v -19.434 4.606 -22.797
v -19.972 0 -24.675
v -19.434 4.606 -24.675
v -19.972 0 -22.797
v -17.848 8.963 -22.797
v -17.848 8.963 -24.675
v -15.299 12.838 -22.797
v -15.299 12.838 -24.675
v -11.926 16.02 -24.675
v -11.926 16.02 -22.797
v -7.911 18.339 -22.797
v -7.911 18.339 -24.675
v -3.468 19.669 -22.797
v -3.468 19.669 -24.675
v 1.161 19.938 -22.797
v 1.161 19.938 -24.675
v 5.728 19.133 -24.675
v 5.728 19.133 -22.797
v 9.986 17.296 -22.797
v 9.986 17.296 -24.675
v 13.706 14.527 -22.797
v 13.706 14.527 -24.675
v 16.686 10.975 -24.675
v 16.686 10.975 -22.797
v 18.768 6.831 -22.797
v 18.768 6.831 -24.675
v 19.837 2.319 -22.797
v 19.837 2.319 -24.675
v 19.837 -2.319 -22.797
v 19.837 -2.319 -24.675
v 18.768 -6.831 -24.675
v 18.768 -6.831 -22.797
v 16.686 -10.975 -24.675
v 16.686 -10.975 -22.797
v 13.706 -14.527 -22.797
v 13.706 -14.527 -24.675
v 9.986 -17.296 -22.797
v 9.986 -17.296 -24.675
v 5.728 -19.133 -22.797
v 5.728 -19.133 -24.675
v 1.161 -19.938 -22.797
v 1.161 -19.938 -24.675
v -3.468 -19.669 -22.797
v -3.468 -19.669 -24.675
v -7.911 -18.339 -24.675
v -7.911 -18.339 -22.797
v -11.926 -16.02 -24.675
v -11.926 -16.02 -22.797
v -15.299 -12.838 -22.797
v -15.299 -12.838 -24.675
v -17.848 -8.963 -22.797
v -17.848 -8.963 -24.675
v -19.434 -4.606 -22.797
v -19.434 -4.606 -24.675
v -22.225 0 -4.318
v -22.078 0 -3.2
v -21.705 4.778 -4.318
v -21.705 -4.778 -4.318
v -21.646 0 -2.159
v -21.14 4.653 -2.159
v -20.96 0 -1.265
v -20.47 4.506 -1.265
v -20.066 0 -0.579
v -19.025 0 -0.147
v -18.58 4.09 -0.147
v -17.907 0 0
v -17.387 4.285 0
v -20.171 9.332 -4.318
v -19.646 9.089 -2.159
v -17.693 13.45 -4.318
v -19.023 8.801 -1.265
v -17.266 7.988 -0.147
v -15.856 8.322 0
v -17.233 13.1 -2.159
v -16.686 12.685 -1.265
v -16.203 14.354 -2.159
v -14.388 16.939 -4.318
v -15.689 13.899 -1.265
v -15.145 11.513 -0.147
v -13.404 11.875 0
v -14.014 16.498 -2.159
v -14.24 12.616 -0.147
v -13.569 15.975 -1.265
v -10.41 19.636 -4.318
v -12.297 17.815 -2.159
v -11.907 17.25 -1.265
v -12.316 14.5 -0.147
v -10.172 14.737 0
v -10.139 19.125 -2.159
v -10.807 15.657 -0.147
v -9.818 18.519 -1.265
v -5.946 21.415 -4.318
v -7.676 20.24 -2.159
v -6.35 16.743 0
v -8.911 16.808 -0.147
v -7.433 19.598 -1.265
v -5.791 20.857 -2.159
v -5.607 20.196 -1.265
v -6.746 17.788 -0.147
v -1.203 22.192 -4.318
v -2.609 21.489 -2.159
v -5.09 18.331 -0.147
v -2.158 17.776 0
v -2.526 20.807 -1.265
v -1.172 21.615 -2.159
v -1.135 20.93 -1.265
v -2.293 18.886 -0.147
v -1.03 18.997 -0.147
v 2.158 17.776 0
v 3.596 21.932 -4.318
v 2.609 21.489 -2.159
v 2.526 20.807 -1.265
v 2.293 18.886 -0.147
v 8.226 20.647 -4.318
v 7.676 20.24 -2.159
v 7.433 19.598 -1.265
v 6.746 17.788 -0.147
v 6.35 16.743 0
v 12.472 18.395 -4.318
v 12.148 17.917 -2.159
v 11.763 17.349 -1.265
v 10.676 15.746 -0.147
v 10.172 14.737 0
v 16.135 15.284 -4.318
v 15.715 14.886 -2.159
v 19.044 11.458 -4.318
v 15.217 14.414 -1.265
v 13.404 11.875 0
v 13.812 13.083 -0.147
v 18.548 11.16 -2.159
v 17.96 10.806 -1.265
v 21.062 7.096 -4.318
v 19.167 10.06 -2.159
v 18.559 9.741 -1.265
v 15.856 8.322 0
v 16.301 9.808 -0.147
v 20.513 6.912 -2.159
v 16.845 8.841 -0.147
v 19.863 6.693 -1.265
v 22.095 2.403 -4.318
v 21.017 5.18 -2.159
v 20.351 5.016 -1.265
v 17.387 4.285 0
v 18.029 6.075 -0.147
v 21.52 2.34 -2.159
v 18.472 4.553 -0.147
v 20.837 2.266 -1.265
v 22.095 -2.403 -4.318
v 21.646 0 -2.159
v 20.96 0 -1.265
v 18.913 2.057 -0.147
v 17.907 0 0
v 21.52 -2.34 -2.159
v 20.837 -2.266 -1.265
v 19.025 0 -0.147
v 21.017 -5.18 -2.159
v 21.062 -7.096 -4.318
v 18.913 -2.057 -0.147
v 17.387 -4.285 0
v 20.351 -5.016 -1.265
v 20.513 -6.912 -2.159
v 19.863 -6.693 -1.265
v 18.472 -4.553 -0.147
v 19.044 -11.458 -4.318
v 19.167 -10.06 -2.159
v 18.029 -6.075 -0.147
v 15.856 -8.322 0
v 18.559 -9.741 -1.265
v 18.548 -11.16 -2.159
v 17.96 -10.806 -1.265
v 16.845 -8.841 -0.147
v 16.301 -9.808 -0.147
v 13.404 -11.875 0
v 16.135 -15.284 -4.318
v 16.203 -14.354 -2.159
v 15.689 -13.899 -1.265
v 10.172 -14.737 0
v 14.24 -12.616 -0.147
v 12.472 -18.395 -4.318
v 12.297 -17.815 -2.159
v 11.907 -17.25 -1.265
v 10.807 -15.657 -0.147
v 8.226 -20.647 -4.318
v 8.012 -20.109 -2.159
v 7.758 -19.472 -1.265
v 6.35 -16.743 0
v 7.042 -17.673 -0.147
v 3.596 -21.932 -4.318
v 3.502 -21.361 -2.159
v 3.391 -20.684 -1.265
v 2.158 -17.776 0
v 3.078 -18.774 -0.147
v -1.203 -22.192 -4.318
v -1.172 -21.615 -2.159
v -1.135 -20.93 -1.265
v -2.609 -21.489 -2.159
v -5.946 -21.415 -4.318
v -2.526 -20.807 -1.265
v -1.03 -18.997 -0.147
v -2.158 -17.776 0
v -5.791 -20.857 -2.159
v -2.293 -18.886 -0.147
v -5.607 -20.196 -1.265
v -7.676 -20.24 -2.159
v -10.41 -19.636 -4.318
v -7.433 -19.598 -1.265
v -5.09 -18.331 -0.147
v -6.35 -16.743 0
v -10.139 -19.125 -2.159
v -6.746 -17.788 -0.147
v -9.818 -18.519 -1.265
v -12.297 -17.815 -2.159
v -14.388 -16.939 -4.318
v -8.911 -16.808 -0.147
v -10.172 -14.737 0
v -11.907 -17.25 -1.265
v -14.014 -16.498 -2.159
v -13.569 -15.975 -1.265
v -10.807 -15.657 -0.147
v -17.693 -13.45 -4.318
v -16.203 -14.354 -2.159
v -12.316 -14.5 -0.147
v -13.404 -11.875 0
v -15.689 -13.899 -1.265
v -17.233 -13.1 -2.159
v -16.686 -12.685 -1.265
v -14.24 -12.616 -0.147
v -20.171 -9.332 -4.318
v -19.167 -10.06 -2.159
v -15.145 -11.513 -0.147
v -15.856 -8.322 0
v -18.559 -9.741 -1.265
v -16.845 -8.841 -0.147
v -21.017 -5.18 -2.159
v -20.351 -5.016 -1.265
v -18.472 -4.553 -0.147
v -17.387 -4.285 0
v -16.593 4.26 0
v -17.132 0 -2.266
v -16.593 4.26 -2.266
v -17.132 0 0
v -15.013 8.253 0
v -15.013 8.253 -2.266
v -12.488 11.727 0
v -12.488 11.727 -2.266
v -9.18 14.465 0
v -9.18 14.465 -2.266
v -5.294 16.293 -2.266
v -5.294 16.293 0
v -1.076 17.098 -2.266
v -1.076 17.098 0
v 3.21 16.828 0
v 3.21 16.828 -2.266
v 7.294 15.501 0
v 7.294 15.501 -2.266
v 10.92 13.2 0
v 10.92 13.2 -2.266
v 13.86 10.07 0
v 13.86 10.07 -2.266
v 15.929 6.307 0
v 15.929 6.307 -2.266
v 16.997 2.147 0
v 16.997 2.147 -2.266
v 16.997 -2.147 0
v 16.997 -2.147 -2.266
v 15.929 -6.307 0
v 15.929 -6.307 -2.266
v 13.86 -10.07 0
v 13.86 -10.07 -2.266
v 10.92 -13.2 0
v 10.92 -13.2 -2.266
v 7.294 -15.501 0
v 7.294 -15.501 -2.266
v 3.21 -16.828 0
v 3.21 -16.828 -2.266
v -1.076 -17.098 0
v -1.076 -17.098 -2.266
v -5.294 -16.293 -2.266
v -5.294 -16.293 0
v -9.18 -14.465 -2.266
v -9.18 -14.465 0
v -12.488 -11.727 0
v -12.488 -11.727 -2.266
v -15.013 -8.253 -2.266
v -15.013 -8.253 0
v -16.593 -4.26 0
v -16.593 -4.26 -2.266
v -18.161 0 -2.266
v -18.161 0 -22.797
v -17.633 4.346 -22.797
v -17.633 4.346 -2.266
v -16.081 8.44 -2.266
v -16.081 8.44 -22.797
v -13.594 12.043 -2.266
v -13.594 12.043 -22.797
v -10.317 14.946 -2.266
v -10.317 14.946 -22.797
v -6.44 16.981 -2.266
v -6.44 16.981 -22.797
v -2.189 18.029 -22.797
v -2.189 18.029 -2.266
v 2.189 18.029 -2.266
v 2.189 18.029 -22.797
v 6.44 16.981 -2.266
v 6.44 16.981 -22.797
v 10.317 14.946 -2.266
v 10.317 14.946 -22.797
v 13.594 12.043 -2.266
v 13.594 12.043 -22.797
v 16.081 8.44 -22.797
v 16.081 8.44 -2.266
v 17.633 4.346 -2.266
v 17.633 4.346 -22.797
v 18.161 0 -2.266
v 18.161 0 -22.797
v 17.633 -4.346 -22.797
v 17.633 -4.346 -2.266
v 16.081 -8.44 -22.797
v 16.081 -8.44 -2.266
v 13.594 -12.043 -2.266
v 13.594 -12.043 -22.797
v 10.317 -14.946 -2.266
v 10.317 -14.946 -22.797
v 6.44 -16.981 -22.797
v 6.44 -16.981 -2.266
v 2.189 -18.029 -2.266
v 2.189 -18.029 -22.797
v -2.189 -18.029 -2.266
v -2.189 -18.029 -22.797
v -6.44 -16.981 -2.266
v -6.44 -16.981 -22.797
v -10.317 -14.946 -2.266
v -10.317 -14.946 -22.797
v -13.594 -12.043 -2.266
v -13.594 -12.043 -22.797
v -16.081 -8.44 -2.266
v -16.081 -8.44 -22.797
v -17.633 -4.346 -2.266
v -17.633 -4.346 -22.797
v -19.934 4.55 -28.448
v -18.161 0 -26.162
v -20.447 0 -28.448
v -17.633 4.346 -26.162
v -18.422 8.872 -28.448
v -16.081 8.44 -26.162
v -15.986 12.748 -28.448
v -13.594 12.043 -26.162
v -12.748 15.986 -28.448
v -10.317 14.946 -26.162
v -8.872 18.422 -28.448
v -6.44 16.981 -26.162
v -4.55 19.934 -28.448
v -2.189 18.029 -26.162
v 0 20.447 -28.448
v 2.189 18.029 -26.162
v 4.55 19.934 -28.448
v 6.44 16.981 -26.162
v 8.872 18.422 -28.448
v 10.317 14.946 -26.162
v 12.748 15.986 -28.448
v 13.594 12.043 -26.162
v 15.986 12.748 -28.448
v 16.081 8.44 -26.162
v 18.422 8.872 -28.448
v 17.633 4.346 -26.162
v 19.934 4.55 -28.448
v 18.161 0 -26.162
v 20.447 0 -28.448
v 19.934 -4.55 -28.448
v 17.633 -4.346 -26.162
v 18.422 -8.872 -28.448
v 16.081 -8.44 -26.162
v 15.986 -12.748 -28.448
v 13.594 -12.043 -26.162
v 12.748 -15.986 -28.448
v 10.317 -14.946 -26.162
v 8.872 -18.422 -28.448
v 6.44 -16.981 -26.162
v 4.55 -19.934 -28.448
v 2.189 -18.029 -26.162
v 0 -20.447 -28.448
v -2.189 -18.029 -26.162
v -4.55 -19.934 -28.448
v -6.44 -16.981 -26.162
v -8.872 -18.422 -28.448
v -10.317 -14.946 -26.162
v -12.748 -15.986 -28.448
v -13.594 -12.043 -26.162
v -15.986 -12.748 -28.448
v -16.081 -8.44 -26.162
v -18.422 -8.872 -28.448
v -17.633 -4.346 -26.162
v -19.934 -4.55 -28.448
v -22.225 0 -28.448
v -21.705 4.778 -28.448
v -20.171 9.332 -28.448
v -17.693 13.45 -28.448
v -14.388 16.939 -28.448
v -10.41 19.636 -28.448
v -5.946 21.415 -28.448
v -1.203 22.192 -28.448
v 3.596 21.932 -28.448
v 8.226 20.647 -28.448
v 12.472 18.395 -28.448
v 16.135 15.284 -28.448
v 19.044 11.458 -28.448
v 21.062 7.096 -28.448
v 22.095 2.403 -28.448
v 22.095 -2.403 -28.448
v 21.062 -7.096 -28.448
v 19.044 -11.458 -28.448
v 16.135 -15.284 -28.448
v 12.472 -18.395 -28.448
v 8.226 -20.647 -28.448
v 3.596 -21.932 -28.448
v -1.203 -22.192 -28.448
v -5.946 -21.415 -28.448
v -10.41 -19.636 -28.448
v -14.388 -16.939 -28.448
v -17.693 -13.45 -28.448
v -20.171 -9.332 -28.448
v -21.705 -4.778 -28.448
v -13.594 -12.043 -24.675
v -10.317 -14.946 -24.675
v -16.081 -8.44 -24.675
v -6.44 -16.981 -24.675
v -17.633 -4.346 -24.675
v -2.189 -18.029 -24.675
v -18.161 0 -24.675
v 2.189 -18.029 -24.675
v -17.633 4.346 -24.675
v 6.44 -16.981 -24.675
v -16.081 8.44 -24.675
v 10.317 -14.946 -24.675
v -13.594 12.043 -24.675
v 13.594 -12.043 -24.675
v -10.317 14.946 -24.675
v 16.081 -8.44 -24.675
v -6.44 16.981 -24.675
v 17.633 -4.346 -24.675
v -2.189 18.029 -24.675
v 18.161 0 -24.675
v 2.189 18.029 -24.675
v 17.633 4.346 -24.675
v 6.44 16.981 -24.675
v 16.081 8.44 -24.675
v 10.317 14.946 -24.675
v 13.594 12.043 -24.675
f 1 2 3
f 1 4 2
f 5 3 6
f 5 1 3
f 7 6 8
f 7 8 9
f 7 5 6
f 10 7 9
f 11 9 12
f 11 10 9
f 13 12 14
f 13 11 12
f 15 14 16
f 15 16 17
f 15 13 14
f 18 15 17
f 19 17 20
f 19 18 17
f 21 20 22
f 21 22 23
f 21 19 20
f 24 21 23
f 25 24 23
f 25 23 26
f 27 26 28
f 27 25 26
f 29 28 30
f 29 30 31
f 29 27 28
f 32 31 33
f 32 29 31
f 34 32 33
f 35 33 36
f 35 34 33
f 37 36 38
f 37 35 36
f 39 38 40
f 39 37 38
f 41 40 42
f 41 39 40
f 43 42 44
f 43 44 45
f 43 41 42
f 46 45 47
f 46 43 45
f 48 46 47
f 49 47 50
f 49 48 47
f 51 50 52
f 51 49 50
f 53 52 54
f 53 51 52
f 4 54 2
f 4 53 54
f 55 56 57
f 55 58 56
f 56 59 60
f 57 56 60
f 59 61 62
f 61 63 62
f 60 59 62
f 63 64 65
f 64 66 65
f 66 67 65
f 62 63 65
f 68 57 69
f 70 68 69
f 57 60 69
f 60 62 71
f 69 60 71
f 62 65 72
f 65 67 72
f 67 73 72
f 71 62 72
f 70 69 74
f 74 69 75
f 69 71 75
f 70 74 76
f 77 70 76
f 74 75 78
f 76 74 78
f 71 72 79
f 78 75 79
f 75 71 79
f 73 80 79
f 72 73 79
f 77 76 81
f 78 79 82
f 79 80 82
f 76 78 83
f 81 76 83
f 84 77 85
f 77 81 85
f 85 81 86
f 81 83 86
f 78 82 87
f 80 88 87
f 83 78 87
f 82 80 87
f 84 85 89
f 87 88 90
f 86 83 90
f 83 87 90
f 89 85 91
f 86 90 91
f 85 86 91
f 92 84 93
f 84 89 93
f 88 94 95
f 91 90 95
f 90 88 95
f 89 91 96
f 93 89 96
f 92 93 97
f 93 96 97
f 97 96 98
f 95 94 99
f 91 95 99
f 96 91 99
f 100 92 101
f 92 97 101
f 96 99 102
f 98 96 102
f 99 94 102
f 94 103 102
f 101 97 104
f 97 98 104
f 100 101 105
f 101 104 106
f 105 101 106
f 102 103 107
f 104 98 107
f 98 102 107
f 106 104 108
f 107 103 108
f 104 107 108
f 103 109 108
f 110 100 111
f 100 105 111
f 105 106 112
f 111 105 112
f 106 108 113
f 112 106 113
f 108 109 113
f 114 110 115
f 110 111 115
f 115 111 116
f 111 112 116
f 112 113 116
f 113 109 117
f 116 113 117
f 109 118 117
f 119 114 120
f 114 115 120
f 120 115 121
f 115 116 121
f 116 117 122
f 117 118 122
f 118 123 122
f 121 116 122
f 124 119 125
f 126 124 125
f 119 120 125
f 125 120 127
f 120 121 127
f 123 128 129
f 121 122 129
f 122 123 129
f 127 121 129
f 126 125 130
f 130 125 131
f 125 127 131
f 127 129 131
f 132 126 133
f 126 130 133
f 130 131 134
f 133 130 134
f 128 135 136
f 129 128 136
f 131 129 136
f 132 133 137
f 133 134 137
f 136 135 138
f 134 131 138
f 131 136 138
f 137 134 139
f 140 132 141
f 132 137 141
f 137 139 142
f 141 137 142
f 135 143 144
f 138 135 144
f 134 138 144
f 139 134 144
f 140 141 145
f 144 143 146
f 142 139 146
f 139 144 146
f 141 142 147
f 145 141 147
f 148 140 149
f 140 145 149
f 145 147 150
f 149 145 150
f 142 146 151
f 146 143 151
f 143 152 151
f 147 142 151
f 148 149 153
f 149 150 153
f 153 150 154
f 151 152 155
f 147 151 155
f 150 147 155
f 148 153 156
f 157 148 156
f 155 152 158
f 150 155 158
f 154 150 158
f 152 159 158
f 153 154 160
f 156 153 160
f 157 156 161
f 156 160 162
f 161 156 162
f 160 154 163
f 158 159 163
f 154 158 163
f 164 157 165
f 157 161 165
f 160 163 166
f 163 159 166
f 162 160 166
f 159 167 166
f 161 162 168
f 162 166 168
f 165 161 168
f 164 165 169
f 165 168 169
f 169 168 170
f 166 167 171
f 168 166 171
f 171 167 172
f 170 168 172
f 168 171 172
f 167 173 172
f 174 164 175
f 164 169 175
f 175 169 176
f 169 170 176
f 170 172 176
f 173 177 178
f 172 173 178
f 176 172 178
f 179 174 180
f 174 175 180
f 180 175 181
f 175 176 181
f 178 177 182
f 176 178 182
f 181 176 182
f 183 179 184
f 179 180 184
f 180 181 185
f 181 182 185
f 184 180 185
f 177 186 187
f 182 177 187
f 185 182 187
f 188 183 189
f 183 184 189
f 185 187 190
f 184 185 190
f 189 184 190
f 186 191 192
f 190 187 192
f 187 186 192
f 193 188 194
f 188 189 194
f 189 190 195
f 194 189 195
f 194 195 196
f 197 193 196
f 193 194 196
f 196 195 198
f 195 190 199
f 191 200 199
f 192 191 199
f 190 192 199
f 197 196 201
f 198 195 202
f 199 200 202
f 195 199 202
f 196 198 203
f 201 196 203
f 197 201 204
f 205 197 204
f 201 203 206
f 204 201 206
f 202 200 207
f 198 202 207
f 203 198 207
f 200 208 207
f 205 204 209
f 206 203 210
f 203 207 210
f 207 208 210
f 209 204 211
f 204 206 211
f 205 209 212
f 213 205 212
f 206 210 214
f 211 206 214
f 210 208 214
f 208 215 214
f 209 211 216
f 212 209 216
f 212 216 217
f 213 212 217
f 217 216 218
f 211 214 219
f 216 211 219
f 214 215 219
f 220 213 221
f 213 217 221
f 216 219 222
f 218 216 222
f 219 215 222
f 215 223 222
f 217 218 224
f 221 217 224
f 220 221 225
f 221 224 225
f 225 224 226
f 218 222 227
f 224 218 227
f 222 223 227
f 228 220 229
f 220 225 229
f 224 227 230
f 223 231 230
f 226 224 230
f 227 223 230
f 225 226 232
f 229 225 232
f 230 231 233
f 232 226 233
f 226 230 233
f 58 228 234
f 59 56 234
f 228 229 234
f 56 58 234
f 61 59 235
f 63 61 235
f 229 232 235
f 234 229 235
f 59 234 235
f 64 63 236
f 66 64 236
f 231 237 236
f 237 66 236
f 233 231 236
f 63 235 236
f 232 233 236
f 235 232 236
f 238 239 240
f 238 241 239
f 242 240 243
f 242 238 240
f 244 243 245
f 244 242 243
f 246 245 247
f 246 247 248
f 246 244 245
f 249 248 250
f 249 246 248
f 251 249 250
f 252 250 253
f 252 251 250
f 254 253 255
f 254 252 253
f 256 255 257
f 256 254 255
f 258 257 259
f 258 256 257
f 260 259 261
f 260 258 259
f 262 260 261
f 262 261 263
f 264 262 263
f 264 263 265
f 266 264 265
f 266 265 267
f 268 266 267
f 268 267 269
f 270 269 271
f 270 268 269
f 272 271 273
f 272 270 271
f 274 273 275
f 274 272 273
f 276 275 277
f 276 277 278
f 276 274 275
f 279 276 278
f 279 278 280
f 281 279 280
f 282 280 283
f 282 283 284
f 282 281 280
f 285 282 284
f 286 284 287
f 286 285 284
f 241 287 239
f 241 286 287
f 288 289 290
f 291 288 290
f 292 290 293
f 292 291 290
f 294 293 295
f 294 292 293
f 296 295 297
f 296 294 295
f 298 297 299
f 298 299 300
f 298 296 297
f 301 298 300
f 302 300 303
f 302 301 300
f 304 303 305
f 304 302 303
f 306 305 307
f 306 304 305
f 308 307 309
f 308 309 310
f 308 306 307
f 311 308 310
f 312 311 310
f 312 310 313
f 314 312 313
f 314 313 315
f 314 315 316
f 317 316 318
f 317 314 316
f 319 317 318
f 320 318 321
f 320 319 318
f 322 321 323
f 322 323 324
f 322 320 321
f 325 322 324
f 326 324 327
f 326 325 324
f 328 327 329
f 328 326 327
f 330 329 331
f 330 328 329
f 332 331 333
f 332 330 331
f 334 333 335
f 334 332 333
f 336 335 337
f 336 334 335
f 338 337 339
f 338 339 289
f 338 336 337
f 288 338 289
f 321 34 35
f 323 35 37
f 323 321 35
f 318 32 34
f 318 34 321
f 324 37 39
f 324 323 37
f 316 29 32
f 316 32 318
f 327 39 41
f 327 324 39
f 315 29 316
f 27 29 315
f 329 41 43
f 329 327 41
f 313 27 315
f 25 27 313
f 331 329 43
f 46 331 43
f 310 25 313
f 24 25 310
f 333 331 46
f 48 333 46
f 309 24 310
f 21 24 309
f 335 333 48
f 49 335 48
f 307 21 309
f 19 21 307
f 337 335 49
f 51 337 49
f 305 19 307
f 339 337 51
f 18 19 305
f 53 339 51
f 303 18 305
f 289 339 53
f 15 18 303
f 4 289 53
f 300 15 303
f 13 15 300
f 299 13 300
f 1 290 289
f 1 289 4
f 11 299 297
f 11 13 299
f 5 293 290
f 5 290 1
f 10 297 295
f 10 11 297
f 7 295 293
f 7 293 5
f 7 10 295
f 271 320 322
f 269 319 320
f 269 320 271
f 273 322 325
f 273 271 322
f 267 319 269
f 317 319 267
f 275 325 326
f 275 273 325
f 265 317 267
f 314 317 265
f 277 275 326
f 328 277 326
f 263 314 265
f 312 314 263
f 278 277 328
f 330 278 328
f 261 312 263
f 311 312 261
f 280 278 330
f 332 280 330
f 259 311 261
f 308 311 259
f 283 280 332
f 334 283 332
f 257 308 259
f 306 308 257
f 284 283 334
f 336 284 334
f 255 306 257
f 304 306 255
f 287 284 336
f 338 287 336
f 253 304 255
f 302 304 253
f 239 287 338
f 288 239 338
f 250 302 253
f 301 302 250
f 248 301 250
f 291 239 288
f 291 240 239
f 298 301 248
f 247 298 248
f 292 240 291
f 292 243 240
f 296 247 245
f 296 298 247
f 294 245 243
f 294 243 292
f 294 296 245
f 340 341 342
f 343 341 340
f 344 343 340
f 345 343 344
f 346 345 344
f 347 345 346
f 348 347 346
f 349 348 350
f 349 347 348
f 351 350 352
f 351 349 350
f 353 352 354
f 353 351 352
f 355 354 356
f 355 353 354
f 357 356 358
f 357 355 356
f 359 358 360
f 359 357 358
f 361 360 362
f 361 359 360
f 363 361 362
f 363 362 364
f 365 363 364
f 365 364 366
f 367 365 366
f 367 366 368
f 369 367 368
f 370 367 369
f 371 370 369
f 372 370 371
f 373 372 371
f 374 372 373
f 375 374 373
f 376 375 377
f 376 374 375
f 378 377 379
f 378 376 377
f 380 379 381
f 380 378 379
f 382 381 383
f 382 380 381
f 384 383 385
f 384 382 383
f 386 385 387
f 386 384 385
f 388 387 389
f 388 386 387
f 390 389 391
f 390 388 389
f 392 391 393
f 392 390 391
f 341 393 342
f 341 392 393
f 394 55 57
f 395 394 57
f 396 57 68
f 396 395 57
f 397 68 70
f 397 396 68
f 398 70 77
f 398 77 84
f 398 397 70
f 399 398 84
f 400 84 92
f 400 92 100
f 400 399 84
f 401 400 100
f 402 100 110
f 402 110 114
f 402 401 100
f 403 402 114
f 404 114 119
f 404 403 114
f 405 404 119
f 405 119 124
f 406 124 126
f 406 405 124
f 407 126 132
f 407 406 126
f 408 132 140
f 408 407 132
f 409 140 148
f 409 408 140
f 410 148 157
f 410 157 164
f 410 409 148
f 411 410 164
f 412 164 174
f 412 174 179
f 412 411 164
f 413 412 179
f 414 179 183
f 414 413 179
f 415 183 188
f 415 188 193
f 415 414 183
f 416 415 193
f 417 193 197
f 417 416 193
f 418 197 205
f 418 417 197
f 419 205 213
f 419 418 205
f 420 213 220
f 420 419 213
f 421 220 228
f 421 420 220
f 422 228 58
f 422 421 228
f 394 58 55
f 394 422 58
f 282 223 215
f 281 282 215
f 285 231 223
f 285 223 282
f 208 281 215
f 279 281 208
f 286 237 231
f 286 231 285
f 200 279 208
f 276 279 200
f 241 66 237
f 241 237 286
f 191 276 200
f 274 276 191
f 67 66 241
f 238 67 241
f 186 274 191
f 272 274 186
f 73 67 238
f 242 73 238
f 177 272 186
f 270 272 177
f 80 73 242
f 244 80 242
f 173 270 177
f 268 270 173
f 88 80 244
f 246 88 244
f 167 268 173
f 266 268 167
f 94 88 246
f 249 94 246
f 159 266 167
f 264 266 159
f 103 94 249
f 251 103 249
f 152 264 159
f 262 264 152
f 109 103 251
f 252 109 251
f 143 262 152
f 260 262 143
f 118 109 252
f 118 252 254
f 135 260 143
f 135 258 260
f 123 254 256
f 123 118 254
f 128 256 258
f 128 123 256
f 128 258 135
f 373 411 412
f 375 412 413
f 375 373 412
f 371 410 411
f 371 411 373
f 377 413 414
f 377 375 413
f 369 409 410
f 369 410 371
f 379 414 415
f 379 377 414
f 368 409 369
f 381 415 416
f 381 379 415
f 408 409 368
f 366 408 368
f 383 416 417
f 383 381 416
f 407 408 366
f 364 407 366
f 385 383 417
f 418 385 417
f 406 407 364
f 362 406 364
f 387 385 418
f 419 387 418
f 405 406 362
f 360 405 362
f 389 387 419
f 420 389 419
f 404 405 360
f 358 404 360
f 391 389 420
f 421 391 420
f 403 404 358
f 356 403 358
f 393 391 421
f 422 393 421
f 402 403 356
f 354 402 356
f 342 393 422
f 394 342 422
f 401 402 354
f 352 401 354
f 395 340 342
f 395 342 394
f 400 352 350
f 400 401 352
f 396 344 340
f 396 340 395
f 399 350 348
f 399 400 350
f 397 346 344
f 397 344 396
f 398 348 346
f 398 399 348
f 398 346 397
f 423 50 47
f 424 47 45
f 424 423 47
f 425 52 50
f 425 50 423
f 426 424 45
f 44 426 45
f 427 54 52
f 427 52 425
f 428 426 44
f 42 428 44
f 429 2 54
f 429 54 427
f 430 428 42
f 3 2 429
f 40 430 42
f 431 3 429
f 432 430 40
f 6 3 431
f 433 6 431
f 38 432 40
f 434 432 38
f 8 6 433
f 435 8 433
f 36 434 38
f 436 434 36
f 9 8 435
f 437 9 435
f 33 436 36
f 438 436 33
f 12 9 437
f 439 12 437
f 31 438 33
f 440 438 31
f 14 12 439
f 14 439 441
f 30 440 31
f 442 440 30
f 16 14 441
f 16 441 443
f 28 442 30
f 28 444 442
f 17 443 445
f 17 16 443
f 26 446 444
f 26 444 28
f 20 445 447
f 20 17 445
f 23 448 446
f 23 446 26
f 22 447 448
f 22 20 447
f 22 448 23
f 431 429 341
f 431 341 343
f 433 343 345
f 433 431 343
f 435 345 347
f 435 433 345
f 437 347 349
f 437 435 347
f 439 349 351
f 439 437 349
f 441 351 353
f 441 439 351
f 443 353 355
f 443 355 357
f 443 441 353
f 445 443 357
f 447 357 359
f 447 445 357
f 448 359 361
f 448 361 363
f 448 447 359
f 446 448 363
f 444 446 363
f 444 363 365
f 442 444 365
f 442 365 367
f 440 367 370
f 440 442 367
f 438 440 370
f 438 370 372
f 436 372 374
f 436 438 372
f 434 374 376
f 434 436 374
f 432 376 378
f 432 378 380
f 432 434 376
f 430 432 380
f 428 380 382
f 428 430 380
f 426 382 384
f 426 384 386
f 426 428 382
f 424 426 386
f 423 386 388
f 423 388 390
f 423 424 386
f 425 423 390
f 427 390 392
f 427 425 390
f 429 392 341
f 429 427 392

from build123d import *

# Parameters (mm, degrees)
F2_SIZE = 2.286
F3_R    = 4.318


with BuildPart() as f1:
    # F0 (on Front) → F1 (revolve)
    with BuildSketch(Plane.XZ):
        Polygon((-17.131681, 0), (-22.225, 0), (-22.225, -28.448), (-18.161, -28.448), (-18.161, -24.675057), (-19.972013, -24.675057), (-19.972013, -22.796622), (-18.161, -22.796622), (-18.161, -2.265504), (-17.131681, -2.265504), align=None)
    revolve(axis=Axis((0, 0, -14.224), (0, 0, -1)))

    # F2
    f2_edges = [f1.edges().sort_by_distance(p)[0] for p in [
        (18.161, 0, -28.448),
    ]]
    chamfer(f2_edges, length=F2_SIZE)

    # F3
    f3_edges = [f1.edges().sort_by_distance(p)[0] for p in [
        (22.225, 0, 0),
    ]]
    fillet(f3_edges, radius=F3_R)


solid = f1.part
